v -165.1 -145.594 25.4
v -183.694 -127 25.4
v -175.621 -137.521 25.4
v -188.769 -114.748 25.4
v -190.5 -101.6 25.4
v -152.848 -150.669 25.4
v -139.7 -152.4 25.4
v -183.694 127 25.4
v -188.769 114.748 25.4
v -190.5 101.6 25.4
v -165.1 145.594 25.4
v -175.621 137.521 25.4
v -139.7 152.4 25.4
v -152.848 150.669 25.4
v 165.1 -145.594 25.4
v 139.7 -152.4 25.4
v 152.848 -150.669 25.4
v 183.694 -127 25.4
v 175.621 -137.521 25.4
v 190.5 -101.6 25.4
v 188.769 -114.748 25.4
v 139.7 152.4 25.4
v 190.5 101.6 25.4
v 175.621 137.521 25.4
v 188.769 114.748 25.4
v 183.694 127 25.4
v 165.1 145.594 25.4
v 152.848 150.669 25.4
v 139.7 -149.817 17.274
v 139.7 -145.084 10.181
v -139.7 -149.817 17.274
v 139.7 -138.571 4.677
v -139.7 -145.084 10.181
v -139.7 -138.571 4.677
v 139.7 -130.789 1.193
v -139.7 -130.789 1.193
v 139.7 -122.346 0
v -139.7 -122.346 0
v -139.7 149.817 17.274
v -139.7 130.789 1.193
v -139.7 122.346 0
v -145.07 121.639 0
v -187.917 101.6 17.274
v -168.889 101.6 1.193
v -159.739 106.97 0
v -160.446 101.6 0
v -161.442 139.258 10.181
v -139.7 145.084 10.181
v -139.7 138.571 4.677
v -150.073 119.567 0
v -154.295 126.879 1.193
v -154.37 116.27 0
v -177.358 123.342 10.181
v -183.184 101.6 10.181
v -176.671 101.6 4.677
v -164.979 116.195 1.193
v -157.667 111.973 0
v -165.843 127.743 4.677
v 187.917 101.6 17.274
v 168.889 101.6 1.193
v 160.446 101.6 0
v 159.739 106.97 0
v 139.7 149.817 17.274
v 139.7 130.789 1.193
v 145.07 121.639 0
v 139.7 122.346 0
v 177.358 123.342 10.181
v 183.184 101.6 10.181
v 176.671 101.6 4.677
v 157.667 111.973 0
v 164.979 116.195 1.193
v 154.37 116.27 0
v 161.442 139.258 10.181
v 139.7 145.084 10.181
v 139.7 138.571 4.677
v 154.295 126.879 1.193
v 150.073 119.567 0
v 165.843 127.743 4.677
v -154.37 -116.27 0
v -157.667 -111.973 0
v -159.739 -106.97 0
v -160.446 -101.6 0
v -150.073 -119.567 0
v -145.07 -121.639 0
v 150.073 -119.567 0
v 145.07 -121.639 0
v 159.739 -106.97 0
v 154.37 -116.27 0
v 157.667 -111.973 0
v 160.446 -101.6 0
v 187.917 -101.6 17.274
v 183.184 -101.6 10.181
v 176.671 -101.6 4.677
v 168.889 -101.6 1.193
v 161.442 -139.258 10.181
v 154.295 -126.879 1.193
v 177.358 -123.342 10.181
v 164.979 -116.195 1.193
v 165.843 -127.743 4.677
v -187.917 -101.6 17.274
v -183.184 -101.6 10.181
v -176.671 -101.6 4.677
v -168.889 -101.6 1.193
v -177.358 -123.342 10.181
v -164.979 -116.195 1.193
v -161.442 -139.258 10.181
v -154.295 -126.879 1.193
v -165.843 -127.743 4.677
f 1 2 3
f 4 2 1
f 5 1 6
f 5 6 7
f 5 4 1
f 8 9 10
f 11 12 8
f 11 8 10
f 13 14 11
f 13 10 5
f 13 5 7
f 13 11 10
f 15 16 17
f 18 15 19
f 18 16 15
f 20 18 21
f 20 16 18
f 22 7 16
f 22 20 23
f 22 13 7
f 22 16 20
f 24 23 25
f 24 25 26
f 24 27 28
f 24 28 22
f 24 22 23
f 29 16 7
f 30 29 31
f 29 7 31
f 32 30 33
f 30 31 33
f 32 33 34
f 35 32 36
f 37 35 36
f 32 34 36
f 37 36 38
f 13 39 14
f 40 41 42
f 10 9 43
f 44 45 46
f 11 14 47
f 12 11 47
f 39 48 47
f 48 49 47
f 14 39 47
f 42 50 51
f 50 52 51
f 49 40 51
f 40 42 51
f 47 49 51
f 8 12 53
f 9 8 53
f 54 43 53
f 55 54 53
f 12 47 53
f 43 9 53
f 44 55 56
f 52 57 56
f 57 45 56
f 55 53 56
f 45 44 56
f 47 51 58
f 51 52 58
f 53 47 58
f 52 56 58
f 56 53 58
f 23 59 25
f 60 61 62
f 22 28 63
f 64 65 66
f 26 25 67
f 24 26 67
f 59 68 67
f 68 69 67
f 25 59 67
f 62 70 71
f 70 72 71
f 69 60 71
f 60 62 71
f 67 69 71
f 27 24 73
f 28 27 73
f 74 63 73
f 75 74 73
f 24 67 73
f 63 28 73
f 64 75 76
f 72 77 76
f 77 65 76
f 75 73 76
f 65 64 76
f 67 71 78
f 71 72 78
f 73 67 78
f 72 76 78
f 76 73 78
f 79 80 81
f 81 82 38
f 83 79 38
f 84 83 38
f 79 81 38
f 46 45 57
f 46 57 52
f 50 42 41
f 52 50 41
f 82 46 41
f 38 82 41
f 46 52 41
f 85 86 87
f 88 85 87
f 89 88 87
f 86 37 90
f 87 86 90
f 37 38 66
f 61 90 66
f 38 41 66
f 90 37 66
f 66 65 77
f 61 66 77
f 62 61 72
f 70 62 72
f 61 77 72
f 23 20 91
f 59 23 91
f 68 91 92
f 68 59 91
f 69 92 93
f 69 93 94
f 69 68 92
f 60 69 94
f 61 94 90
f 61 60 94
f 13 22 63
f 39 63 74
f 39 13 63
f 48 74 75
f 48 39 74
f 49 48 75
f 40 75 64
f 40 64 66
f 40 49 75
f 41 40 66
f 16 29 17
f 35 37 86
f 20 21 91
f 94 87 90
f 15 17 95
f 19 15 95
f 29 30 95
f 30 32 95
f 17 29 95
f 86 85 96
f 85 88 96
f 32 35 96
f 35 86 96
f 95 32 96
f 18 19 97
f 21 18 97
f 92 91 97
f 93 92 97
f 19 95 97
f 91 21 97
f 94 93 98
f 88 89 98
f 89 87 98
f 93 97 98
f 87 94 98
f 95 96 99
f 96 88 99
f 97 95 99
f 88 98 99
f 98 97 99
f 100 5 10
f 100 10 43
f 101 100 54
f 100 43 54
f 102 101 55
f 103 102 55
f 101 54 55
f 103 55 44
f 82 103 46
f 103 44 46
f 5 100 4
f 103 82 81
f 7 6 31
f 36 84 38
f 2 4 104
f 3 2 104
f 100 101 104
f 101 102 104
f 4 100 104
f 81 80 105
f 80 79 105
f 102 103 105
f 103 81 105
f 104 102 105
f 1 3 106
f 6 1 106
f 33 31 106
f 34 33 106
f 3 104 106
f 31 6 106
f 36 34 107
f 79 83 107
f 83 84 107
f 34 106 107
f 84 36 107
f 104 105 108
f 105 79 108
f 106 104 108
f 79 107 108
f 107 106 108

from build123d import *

# Parameters (mm, degrees)
F1_DEPTH     = 25.4
F2_T1_DEPTH  = 279.4
F2_T3_DEPTH  = 203.2
F2_T6_ANGLE  = 90
F2_T8_ANGLE  = 90
F2_T10_ANGLE = 90
F2_T12_ANGLE = 90


# Not quite as in the source:
# - a fillet or chamfer that OpenCascade refuses, or shapes differently, is made with other operations: its cross-section is extruded or revolved along the edge and cut away or added


with BuildPart() as f1:
    # F0 (on Top) → F1 (new body)
    with BuildSketch(Plane.XY):
        with BuildLine():
            Line((-139.7, -152.4), (139.7, -152.4))
            ThreePointArc((139.7, -152.4), (175.6210244843, -137.5210244843), (190.5, -101.6))
            Line((190.5, -101.6), (190.5, 101.6))
            ThreePointArc((190.5, 101.6), (175.6210244843, 137.5210244843), (139.7, 152.4))
            Line((139.7, 152.4), (-139.7, 152.4))
            ThreePointArc((-139.7, 152.4), (-175.6210244843, 137.5210244843), (-190.5, 101.6))
            Line((-190.5, 101.6), (-190.5, -101.6))
            ThreePointArc((-190.5, -101.6), (-175.6210244843, -137.5210244843), (-139.7, -152.4))
        make_face()
    extrude(amount=F1_DEPTH)

    # F2: fillet of radius 30.48 on 1 edges, made by hand

    # F2_s2 → F2_t1 (cut)
    with BuildSketch(Plane.YZ.offset(-139.7)):
        with BuildLine():
            ThreePointArc((-152.4, 25.4), (-142.0210701006, 7.2005154696), (-122.3463147019, 0))
            Line((-122.3463147019, 0), (-152.4, 0))
            Line((-152.4, 0), (-152.4, 25.4))
        make_face()
        with BuildLine():
            ThreePointArc((152.4, 25.4), (142.0210701006, 7.2005154696), (122.3463147019, 0))
            Line((122.3463147019, 0), (152.4, 0))
            Line((152.4, 0), (152.4, 25.4))
        make_face()
    extrude(amount=F2_T1_DEPTH, mode=Mode.SUBTRACT)

    # F2_s4 → F2_t3 (cut)
    with BuildSketch(Plane.XZ.offset(-101.6)):
        with BuildLine():
            ThreePointArc((190.5, 25.4), (180.1210701006, 7.2005154696), (160.4463147019, 0))
            Line((160.4463147019, 0), (190.5, 0))
            Line((190.5, 0), (190.5, 25.4))
        make_face()
        with BuildLine():
            ThreePointArc((-190.5, 25.4), (-180.1210701006, 7.2005154696), (-160.4463147019, 0))
            Line((-160.4463147019, 0), (-190.5, 0))
            Line((-190.5, 0), (-190.5, 25.4))
        make_face()
    extrude(amount=F2_T3_DEPTH, mode=Mode.SUBTRACT)

    # F2_s5 → F2_t6 (revolve, cut)
    with BuildSketch(Plane.XZ.offset(101.6)):
        with BuildLine():
            ThreePointArc((-190.5, 25.4), (-180.1210701006, 7.2005154696), (-160.4463147019, 0))
            Line((-160.4463147019, 0), (-190.5, 0))
            Line((-190.5, 0), (-190.5, 25.4))
        make_face()
    revolve(axis=Axis((-139.7, -101.6, 0), (0, 0, 1)), revolution_arc=F2_T6_ANGLE, mode=Mode.SUBTRACT)

    # F2_s7 → F2_t8 (revolve, cut)
    with BuildSketch(Plane.YZ.offset(139.7)):
        with BuildLine():
            ThreePointArc((-152.4, 25.4), (-142.0210701006, 7.2005154696), (-122.3463147019, 0))
            Line((-122.3463147019, 0), (-152.4, 0))
            Line((-152.4, 0), (-152.4, 25.4))
        make_face()
    revolve(axis=Axis((139.7, -101.6, 0), (0, 0, 1)), revolution_arc=F2_T8_ANGLE, mode=Mode.SUBTRACT)

    # F2_s9 → F2_t10 (revolve, cut)
    with BuildSketch(Plane.XZ.offset(-101.6)):
        with BuildLine():
            ThreePointArc((190.5, 25.4), (180.1210701006, 7.2005154696), (160.4463147019, 0))
            Line((160.4463147019, 0), (190.5, 0))
            Line((190.5, 0), (190.5, 25.4))
        make_face()
    revolve(axis=Axis((139.7, 101.6, 0), (0, 0, 1)), revolution_arc=F2_T10_ANGLE, mode=Mode.SUBTRACT)

    # F2_s11 → F2_t12 (revolve, cut)
    with BuildSketch(Plane.YZ.offset(-139.7)):
        with BuildLine():
            ThreePointArc((152.4, 25.4), (142.0210701006, 7.2005154696), (122.3463147019, 0))
            Line((122.3463147019, 0), (152.4, 0))
            Line((152.4, 0), (152.4, 25.4))
        make_face()
    revolve(axis=Axis((-139.7, 101.6, 0), (0, 0, 1)), revolution_arc=F2_T12_ANGLE, mode=Mode.SUBTRACT)


solid = f1.part
